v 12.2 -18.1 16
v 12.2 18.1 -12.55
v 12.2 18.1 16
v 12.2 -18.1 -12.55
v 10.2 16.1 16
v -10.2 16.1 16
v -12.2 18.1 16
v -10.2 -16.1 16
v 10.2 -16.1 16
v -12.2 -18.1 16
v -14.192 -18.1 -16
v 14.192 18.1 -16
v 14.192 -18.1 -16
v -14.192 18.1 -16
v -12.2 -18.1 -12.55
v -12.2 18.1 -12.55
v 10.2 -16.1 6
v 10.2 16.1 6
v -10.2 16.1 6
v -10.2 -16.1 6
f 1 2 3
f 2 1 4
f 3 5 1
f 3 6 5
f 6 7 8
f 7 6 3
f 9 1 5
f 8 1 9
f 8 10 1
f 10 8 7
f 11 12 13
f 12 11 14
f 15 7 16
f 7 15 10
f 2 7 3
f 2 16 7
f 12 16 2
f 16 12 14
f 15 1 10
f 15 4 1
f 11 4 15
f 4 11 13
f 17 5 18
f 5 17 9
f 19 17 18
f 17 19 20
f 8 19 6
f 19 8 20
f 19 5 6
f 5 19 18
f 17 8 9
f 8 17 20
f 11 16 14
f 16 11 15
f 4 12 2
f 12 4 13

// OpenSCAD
// defined with millimeters

// Measure your legs and put in its size (width and length)
// Frame is the upper part that holds the leg inside. You can choose thickness and height of the frame
// Brim is the slightly wider part at the bottom (not the same brim that you define in your slicer)
// Total height of the item will be add_height + frame_height
// Total width of the item will be 
//  at the top:    leg_width + frame_thickness * 2 
//  at the bottom: leg_width + frame_thickness * 2 + brim_width * 2
// Total length of the item will be
//   leg_length + frame_thickness * 2


// Narrow part of the leg
leg_width = 20.4;  // [3:0.1:200]
// Wide part of the leg
leg_length = 32.2; // [3:0.1:200]
// How much height to add
add_height = 22;   // [2:1:150]

frame_thickness = 2; // [1:1:20]
frame_height = 10;   // [3:1:50]

// Brim at the bottom for better stability
brim_width = 2; // [0:1:5]

module brim (bw, bl) {
    rotate([90,30,0]) cylinder(r=bw*1.15,h=bl, $fn=3);
}

module legy(lw, ll, ah, ft, fh, bw) {
    union () {
        difference () {
            cube([lw + ft*2, ll + ft*2, ah+fh],center=true);
            translate ([0,0,ah/2]) cube([lw, ll, fh], center=true);
        }
        translate ([-1 * (lw/2 + ft),ll/2 + ft,((ah+fh)/-2)+bw*0.575]) brim(bw,ll + ft * 2);
        translate ([(lw/2 + ft),ll/2 + ft,((ah+fh)/-2)+bw*0.575]) brim(bw,ll + ft * 2);
    }
}

legy(leg_width, leg_length, add_height, frame_thickness, frame_height, brim_width);
